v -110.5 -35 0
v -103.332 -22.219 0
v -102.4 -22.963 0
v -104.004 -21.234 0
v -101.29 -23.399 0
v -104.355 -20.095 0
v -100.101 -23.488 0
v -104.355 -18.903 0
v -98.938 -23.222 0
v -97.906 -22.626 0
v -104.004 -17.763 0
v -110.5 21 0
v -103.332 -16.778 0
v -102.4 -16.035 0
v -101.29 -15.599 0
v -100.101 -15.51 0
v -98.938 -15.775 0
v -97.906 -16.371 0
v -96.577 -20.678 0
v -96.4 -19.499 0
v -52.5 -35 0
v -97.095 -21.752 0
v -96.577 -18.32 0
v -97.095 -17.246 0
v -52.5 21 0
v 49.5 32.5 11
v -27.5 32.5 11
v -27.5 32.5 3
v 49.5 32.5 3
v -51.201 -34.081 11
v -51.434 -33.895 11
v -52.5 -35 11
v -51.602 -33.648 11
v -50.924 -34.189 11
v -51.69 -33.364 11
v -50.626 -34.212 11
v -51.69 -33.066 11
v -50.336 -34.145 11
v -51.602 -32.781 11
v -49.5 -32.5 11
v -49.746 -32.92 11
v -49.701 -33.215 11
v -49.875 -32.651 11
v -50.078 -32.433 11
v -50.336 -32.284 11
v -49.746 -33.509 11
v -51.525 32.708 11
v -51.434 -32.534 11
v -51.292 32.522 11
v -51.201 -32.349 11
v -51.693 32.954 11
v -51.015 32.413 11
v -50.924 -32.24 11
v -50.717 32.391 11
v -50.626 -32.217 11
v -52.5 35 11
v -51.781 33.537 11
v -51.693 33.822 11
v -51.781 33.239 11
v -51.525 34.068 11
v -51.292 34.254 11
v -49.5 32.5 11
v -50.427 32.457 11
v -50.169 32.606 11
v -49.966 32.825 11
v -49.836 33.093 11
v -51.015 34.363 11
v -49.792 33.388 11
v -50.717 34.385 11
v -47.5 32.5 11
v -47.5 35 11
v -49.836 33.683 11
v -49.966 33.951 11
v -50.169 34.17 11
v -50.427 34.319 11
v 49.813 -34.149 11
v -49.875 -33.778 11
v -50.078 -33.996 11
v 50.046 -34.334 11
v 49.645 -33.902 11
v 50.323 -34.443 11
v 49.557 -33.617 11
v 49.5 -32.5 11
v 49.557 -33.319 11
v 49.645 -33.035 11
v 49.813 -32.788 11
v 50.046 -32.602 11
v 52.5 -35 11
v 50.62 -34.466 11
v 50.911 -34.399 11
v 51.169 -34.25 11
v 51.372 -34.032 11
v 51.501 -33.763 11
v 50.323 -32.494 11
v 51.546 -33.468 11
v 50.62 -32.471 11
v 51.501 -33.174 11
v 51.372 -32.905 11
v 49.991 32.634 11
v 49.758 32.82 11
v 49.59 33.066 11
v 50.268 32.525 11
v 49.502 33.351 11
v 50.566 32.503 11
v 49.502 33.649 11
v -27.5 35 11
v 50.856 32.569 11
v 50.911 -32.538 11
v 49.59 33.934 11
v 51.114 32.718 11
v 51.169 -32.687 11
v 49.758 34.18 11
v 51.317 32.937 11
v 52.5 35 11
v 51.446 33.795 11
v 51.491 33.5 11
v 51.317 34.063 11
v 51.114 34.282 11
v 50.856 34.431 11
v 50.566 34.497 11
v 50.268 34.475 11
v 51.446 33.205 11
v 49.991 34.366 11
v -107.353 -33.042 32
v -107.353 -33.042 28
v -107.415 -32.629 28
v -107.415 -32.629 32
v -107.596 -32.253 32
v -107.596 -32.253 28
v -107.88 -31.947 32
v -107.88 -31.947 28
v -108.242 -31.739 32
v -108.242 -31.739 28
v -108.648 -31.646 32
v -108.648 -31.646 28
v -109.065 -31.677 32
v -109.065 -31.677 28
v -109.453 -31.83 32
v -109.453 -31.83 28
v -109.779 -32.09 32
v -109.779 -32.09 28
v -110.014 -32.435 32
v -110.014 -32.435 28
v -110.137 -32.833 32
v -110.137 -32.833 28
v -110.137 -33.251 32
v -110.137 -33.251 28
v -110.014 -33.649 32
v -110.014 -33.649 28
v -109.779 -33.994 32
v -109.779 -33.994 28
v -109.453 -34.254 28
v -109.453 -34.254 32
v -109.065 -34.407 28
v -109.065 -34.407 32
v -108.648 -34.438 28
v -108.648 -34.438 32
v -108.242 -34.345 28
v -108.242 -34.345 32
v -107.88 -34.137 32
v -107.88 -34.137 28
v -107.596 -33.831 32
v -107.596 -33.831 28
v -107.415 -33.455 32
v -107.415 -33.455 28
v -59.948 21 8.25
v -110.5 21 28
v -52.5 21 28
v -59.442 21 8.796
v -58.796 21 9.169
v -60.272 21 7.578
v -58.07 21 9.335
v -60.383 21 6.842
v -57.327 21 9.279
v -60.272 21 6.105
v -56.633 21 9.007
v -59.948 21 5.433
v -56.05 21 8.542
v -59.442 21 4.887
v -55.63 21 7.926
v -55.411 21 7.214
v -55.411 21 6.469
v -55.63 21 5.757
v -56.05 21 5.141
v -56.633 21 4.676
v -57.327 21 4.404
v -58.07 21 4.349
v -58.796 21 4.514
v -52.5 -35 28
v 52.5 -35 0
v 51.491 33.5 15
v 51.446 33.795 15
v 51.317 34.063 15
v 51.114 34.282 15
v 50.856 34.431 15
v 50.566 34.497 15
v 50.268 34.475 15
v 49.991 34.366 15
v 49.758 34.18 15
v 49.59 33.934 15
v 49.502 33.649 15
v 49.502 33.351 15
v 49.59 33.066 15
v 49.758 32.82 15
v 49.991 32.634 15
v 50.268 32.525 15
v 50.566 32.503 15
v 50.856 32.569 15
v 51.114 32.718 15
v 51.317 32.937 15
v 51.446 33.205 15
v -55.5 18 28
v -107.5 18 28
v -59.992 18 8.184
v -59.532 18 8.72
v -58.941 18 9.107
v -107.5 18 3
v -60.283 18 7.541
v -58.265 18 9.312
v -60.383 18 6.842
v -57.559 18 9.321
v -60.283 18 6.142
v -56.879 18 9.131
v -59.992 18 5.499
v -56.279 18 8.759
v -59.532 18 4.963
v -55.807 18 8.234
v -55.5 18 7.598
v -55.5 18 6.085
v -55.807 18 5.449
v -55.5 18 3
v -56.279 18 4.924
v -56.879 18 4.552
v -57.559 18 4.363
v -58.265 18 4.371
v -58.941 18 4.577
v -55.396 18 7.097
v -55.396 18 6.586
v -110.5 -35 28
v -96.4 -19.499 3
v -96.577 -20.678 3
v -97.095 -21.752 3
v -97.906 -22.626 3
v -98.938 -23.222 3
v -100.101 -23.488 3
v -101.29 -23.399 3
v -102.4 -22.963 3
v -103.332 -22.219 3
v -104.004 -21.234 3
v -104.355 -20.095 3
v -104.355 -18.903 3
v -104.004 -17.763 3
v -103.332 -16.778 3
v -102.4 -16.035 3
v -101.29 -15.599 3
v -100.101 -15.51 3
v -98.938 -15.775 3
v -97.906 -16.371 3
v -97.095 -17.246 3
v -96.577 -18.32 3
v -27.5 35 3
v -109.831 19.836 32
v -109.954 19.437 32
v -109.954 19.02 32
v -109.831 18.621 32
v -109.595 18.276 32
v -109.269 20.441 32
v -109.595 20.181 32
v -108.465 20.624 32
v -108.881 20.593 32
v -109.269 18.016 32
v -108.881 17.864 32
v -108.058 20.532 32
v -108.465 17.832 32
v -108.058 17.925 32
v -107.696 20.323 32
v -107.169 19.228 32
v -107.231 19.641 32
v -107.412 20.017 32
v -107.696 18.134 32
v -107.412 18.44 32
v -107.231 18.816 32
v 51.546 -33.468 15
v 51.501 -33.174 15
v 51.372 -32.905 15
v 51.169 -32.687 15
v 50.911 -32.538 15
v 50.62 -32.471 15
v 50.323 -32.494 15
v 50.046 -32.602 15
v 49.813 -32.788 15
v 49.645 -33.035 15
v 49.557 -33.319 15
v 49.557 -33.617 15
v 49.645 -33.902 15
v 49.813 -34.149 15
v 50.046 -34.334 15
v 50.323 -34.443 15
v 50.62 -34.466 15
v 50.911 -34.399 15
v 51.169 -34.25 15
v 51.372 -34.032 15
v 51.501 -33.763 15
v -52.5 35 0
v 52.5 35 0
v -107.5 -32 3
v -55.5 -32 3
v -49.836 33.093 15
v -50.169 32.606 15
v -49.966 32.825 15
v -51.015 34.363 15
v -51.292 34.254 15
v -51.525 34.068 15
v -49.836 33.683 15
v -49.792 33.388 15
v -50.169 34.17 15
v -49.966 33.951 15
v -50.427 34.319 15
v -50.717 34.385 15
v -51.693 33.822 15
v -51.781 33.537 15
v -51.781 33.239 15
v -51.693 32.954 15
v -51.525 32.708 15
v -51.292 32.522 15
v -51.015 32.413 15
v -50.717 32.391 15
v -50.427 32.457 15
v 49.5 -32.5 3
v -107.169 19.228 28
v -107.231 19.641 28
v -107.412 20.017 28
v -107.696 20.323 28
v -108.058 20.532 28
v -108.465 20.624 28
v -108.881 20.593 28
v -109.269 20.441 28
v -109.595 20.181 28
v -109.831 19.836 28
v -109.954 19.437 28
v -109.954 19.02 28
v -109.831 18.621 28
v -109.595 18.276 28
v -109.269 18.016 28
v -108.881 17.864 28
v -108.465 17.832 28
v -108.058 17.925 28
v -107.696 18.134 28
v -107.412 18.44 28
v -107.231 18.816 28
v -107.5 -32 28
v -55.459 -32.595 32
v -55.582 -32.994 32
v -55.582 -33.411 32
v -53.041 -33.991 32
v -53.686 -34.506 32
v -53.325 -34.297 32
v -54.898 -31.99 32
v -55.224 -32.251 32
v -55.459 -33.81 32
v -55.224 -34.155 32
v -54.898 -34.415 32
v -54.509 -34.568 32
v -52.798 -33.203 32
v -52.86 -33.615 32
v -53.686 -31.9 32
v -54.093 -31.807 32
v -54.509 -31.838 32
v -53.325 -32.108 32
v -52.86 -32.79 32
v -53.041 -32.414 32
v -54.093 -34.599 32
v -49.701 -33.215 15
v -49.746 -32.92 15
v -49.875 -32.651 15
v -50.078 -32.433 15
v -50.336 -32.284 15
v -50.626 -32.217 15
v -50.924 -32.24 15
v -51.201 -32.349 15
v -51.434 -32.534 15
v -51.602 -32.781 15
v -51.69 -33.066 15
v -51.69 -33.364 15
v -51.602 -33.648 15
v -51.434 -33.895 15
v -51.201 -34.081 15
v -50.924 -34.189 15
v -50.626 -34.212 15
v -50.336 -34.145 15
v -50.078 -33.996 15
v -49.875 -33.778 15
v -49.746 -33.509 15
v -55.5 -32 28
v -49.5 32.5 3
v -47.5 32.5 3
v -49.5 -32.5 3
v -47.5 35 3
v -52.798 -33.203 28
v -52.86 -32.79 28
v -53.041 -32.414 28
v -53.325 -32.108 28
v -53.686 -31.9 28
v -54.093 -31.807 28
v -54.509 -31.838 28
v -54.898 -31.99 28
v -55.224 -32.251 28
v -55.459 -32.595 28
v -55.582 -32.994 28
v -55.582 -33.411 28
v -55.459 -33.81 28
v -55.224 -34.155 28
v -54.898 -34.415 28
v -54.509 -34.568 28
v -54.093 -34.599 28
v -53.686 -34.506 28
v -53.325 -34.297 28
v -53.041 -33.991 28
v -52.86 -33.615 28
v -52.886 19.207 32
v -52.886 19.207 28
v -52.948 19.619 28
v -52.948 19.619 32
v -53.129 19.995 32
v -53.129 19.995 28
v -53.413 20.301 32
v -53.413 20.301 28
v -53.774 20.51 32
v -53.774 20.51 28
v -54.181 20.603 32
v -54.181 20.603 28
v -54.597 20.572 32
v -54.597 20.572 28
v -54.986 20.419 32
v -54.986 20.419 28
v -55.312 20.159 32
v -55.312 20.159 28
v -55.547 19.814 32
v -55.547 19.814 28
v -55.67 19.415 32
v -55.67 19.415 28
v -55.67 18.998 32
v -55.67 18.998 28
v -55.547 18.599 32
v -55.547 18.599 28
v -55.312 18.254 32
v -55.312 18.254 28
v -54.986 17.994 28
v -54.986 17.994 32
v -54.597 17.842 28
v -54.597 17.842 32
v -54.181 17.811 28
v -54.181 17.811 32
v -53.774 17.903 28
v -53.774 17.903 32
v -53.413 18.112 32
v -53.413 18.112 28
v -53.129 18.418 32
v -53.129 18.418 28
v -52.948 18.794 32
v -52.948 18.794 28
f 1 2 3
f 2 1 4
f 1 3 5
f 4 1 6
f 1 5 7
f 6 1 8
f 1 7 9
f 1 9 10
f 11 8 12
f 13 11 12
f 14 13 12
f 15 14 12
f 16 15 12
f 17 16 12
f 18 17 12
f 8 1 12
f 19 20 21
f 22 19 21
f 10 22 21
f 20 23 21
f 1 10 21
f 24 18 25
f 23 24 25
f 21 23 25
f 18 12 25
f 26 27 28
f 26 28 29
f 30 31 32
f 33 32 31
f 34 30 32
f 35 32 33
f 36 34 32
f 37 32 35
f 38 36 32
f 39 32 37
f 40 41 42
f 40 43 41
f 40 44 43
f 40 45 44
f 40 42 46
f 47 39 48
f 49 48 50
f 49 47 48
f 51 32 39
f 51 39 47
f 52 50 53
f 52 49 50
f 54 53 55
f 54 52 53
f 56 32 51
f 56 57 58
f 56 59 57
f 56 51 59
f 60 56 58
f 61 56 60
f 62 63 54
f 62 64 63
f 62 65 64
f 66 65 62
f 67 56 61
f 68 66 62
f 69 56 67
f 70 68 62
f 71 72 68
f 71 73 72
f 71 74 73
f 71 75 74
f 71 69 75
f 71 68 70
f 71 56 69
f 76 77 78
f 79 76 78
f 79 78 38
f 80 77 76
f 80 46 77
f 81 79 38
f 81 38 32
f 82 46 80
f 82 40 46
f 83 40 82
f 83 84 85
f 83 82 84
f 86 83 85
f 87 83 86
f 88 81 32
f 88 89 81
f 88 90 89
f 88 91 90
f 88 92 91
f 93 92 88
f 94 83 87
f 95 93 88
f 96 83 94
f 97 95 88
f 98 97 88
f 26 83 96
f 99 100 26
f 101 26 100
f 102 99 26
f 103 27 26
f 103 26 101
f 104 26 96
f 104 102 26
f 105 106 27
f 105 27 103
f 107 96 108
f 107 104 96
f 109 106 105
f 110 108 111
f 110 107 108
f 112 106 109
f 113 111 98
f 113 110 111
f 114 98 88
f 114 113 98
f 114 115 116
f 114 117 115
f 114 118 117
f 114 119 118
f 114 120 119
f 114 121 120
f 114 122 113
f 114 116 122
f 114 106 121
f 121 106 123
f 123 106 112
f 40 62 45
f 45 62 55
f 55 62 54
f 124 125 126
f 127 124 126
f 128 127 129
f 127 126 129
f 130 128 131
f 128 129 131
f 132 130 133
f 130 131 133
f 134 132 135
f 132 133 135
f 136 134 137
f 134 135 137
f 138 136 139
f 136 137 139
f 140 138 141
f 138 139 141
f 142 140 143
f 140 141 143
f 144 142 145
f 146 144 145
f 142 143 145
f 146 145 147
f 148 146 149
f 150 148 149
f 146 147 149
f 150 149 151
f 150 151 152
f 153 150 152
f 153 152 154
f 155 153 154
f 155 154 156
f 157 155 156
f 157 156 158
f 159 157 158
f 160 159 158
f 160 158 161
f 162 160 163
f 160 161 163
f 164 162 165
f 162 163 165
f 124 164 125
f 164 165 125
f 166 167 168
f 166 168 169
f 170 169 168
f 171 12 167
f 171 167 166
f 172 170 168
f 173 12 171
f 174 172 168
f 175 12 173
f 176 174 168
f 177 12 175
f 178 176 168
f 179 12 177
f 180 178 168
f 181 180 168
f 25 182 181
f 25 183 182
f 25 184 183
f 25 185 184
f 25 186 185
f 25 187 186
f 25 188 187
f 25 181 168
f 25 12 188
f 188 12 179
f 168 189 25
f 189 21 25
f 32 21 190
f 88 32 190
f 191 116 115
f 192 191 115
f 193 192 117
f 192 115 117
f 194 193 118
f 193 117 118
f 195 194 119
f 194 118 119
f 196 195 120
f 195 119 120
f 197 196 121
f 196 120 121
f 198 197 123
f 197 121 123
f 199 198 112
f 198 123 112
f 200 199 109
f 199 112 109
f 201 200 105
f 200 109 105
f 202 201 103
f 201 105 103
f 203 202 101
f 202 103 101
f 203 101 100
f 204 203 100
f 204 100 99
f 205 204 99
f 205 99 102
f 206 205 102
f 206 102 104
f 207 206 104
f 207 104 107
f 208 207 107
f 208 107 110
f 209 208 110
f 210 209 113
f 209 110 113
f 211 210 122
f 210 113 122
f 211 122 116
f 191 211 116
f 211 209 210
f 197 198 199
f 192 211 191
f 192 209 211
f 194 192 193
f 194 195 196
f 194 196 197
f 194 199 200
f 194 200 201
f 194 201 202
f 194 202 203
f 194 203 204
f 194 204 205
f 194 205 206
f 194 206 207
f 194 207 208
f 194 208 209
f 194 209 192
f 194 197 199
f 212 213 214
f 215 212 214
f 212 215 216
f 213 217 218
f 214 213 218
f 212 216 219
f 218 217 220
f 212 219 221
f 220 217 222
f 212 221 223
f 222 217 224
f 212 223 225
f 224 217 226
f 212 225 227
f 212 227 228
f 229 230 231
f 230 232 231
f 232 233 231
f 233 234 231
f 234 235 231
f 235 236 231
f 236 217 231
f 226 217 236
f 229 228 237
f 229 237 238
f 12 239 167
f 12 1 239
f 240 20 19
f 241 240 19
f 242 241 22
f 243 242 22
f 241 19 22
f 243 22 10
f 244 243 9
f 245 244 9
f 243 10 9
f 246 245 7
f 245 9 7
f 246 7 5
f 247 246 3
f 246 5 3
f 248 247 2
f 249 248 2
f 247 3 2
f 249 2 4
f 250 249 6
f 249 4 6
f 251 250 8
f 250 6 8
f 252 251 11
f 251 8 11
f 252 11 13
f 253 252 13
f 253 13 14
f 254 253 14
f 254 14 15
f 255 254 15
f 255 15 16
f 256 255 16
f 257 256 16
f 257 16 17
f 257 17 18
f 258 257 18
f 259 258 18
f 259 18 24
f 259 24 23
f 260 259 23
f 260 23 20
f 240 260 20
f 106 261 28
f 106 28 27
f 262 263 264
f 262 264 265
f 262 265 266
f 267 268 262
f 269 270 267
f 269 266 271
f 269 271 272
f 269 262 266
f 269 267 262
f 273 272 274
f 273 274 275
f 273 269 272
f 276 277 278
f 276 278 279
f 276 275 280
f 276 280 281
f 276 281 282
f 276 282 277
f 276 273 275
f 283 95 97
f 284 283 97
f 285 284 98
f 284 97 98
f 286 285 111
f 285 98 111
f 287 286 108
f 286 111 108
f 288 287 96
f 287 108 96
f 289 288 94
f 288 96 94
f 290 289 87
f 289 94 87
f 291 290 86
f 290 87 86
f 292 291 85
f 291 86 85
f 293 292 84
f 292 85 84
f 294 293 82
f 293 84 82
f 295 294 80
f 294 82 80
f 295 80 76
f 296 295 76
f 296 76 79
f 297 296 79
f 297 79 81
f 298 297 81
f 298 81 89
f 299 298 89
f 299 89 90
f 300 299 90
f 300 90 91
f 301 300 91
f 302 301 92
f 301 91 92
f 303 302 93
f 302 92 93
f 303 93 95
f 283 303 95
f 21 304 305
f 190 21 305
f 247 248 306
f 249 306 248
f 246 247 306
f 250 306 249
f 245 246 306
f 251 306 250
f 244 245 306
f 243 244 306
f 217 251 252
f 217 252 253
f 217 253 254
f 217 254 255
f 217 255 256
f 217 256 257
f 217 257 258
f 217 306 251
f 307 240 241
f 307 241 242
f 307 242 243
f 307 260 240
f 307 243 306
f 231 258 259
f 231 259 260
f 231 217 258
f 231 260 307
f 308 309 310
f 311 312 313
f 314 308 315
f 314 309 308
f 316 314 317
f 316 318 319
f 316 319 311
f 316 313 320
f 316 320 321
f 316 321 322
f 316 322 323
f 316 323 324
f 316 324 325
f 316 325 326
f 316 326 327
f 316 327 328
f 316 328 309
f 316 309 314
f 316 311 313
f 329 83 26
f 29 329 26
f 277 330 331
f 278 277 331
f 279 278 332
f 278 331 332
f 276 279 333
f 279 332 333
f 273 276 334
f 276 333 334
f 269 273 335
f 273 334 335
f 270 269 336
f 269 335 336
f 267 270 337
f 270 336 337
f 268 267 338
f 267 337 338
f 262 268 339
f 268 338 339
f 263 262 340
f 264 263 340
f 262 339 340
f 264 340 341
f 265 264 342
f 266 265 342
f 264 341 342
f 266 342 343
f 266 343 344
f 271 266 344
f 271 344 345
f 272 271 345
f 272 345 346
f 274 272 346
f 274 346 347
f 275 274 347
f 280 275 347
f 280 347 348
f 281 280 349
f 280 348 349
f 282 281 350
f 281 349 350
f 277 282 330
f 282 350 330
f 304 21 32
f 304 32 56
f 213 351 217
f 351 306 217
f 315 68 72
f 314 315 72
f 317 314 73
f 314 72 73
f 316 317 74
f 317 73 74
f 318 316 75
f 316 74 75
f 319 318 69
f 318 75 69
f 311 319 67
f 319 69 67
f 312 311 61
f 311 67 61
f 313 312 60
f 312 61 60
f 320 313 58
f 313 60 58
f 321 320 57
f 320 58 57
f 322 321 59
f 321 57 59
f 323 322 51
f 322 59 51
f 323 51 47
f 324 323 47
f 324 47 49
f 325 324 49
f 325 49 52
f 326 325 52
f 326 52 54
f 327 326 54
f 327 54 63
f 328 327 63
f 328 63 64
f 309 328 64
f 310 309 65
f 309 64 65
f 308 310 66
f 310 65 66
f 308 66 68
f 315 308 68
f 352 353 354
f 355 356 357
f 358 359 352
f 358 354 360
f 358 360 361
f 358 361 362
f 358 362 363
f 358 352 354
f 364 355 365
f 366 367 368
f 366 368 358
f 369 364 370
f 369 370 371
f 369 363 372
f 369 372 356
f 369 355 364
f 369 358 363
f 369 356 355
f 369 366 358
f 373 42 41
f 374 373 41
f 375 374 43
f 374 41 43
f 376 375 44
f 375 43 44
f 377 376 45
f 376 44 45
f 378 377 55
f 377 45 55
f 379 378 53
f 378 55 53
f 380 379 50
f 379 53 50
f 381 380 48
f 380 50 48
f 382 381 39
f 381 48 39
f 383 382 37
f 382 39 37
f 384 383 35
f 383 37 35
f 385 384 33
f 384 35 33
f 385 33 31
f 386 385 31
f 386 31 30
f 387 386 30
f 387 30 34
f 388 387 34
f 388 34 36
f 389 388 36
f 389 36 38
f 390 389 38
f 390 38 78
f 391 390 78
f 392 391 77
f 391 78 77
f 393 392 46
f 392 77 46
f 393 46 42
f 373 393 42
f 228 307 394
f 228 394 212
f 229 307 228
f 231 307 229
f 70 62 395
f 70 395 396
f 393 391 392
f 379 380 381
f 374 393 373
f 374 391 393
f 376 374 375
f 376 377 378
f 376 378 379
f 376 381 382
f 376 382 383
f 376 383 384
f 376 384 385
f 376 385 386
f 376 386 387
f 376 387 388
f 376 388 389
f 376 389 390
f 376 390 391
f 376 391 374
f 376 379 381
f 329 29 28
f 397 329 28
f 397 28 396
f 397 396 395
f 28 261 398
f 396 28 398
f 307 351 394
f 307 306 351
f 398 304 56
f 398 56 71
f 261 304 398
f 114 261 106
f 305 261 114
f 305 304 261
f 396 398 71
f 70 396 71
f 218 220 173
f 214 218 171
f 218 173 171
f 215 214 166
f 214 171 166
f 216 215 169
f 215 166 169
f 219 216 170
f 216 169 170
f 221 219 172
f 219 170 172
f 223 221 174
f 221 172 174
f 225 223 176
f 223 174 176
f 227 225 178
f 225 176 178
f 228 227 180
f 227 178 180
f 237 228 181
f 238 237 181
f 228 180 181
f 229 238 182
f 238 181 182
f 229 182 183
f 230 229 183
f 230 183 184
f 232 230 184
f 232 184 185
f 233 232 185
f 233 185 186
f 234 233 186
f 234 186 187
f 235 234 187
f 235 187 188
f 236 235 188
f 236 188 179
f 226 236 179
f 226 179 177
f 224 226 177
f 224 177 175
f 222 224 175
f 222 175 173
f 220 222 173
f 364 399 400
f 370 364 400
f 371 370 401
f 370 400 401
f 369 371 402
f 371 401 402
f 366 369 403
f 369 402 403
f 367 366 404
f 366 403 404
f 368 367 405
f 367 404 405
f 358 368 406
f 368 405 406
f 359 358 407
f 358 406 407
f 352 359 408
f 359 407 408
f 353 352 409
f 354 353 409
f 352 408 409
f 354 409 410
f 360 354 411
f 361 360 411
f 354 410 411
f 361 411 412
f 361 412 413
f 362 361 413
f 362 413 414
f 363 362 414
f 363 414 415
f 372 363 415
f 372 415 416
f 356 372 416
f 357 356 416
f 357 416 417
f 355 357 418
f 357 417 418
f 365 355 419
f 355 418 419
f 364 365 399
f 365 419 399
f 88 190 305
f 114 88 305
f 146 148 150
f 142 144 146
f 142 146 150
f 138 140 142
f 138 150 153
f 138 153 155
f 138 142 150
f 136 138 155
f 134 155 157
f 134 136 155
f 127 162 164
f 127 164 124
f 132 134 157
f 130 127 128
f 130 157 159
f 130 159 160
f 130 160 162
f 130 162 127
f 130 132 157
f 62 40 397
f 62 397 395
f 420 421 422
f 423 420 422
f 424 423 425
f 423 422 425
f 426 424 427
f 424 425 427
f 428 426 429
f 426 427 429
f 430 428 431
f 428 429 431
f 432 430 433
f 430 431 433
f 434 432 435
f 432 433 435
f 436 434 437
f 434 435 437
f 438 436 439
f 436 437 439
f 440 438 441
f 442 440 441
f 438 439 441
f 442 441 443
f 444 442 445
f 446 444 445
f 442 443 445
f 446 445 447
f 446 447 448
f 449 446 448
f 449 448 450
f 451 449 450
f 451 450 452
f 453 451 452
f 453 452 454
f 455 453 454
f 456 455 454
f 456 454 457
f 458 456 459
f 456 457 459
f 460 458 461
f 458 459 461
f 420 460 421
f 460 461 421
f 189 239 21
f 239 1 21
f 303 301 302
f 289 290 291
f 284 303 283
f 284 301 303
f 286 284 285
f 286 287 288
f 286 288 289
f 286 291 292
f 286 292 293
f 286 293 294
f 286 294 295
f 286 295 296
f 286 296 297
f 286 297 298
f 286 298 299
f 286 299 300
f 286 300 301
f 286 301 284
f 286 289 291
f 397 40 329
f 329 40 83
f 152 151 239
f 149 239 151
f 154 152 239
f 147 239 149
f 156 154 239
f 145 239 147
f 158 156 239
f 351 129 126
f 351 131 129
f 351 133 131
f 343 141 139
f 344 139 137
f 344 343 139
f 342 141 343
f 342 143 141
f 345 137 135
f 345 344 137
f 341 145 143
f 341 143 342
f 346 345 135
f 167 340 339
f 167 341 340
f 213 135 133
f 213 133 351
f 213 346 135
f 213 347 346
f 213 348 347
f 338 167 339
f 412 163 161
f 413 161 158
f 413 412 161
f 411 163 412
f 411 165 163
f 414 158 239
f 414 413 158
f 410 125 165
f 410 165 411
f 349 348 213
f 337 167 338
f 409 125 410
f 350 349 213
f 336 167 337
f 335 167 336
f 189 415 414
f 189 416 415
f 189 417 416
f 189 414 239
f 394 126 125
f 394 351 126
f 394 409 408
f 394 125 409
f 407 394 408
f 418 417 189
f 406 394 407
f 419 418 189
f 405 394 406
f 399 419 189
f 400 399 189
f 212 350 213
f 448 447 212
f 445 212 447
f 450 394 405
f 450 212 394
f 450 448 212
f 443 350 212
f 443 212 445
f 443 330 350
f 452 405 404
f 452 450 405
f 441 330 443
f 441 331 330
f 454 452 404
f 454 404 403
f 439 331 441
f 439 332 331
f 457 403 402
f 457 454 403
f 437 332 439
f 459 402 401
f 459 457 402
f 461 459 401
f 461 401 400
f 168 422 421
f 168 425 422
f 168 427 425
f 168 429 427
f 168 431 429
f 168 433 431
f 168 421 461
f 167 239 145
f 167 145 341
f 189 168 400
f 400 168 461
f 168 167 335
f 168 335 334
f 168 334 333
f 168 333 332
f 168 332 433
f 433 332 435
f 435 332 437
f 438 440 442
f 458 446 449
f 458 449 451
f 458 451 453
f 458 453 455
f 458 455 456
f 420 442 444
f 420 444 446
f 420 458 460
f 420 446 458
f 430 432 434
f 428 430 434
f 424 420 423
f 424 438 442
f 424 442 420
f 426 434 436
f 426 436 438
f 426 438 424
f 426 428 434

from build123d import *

# Parameters (mm, degrees)
F1_W      = 58
F1_H      = 56
F2_DEPTH  = 11
F0_W      = 105
F0_H      = 70
F3_W      = 99
F3_H      = 65
F4_DEPTH  = 8
F5_W      = 20
F5_H      = 8
F6_DEPTH  = 2.5
F7_W      = 52
F7_H      = 50
F8_DEPTH  = 8
F9_R      = 4
F10_DEPTH = 4
F11_DEPTH = 17
F12_R     = 2.5
F13_DEPTH = 3
F14_R     = 1.4
F15_DEPTH = 4
F16_R     = 1.4
F17_DEPTH = 4
F18_R     = 1
F19_DEPTH = 4
F20_R     = 1
F21_DEPTH = 4
F22_R     = 1
F23_DEPTH = 4
F24_R     = 1
F25_DEPTH = 4


with BuildPart() as f2:
    # F1 (on Top) → F2 (new body)
    with BuildSketch(Plane.XY):
        with Locations((-81.5, -7)):
            Rectangle(F1_W, F1_H)
    extrude(amount=F2_DEPTH)

    # F7 (on face) → F8 (cut)
    with BuildSketch(Plane.XY.offset(11)):
        with Locations((-81.5, -7)):
            Rectangle(F7_W, F7_H)
    extrude(amount=-F8_DEPTH, mode=Mode.SUBTRACT)

    # F9 (on face) → F10 (cut)
    with BuildSketch(Plane(origin=(0, 0, 0), x_dir=(1, 0, 0), z_dir=(0, 0, -1))):
        with Locations((-100.399762392, 19.4988027215)):
            Circle(F9_R)
    extrude(amount=-F10_DEPTH, mode=Mode.SUBTRACT)

    # F11 (add): a face of the model
    f11_faces = [f2.faces().sort_by_distance(p)[0] for p in [
        (-53.3062257748, -7, 11),
    ]]
    extrude(f11_faces, amount=F11_DEPTH)

    # F12 (on face) → F13 (cut)
    with BuildSketch(Plane(origin=(0, 21, 0), x_dir=(-1, 0, 0), z_dir=(0, 1, 0))):
        with Locations((57.8828938305, 6.8415487185)):
            Circle(F12_R)
    extrude(amount=-F13_DEPTH, mode=Mode.SUBTRACT)

    # F14 (on face) → F15 (join)
    with BuildSketch(Plane.XY.offset(28)):
        with Locations((-108.5691526532, 19.2284081131)):
            Circle(F14_R)
    extrude(amount=F15_DEPTH)

    # F16 (on face) → F17 (join)
    with BuildSketch(Plane.XY.offset(28)):
        with Locations((-108.75300318, -33.0420061946)):
            Circle(F16_R)
        with Locations((-54.1975349188, -33.2027859986)):
            Circle(F16_R)
        with Locations((-54.2859174311, 19.2066654563)):
            Circle(F16_R)
    extrude(amount=F17_DEPTH)


with BuildPart() as f2b:
    # F0 (on Top) → F2, piece 2 (new body)
    with BuildSketch(Plane.XY):
        Rectangle(F0_W, F0_H)
    extrude(amount=F2_DEPTH)

    # F3 (on face) → F4 (cut)
    with BuildSketch(Plane.XY.offset(11)):
        Rectangle(F3_W, F3_H)
    extrude(amount=-F4_DEPTH, mode=Mode.SUBTRACT)

    # F5 (on face) → F6 (cut)
    with BuildSketch(Plane(origin=(0, 35, 0), x_dir=(-1, 0, 0), z_dir=(0, 1, 0))):
        with Locations((37.5, 7)):
            Rectangle(F5_W, F5_H)
    extrude(amount=-F6_DEPTH, mode=Mode.SUBTRACT)

    # F18 (on face) → F19 (join)
    with BuildSketch(Plane.XY.offset(11)):
        with Locations((-50.7920049131, 33.3879701793)):
            Circle(F18_R)
    extrude(amount=F19_DEPTH)

    # F20 (on face) → F21 (join)
    with BuildSketch(Plane.XY.offset(11)):
        with Locations((50.4908375442, 33.5)):
            Circle(F20_R)
    extrude(amount=F21_DEPTH)

    # F22 (on face) → F23 (join)
    with BuildSketch(Plane.XY.offset(11)):
        with Locations((50.5457408726, -33.4684327245)):
            Circle(F22_R)
    extrude(amount=F23_DEPTH)

    # F24 (on face) → F25 (join)
    with BuildSketch(Plane.XY.offset(11)):
        with Locations((-50.7011041045, -33.2145504653)):
            Circle(F24_R)
    extrude(amount=F25_DEPTH)


solid = Compound([f2.part, f2b.part])
